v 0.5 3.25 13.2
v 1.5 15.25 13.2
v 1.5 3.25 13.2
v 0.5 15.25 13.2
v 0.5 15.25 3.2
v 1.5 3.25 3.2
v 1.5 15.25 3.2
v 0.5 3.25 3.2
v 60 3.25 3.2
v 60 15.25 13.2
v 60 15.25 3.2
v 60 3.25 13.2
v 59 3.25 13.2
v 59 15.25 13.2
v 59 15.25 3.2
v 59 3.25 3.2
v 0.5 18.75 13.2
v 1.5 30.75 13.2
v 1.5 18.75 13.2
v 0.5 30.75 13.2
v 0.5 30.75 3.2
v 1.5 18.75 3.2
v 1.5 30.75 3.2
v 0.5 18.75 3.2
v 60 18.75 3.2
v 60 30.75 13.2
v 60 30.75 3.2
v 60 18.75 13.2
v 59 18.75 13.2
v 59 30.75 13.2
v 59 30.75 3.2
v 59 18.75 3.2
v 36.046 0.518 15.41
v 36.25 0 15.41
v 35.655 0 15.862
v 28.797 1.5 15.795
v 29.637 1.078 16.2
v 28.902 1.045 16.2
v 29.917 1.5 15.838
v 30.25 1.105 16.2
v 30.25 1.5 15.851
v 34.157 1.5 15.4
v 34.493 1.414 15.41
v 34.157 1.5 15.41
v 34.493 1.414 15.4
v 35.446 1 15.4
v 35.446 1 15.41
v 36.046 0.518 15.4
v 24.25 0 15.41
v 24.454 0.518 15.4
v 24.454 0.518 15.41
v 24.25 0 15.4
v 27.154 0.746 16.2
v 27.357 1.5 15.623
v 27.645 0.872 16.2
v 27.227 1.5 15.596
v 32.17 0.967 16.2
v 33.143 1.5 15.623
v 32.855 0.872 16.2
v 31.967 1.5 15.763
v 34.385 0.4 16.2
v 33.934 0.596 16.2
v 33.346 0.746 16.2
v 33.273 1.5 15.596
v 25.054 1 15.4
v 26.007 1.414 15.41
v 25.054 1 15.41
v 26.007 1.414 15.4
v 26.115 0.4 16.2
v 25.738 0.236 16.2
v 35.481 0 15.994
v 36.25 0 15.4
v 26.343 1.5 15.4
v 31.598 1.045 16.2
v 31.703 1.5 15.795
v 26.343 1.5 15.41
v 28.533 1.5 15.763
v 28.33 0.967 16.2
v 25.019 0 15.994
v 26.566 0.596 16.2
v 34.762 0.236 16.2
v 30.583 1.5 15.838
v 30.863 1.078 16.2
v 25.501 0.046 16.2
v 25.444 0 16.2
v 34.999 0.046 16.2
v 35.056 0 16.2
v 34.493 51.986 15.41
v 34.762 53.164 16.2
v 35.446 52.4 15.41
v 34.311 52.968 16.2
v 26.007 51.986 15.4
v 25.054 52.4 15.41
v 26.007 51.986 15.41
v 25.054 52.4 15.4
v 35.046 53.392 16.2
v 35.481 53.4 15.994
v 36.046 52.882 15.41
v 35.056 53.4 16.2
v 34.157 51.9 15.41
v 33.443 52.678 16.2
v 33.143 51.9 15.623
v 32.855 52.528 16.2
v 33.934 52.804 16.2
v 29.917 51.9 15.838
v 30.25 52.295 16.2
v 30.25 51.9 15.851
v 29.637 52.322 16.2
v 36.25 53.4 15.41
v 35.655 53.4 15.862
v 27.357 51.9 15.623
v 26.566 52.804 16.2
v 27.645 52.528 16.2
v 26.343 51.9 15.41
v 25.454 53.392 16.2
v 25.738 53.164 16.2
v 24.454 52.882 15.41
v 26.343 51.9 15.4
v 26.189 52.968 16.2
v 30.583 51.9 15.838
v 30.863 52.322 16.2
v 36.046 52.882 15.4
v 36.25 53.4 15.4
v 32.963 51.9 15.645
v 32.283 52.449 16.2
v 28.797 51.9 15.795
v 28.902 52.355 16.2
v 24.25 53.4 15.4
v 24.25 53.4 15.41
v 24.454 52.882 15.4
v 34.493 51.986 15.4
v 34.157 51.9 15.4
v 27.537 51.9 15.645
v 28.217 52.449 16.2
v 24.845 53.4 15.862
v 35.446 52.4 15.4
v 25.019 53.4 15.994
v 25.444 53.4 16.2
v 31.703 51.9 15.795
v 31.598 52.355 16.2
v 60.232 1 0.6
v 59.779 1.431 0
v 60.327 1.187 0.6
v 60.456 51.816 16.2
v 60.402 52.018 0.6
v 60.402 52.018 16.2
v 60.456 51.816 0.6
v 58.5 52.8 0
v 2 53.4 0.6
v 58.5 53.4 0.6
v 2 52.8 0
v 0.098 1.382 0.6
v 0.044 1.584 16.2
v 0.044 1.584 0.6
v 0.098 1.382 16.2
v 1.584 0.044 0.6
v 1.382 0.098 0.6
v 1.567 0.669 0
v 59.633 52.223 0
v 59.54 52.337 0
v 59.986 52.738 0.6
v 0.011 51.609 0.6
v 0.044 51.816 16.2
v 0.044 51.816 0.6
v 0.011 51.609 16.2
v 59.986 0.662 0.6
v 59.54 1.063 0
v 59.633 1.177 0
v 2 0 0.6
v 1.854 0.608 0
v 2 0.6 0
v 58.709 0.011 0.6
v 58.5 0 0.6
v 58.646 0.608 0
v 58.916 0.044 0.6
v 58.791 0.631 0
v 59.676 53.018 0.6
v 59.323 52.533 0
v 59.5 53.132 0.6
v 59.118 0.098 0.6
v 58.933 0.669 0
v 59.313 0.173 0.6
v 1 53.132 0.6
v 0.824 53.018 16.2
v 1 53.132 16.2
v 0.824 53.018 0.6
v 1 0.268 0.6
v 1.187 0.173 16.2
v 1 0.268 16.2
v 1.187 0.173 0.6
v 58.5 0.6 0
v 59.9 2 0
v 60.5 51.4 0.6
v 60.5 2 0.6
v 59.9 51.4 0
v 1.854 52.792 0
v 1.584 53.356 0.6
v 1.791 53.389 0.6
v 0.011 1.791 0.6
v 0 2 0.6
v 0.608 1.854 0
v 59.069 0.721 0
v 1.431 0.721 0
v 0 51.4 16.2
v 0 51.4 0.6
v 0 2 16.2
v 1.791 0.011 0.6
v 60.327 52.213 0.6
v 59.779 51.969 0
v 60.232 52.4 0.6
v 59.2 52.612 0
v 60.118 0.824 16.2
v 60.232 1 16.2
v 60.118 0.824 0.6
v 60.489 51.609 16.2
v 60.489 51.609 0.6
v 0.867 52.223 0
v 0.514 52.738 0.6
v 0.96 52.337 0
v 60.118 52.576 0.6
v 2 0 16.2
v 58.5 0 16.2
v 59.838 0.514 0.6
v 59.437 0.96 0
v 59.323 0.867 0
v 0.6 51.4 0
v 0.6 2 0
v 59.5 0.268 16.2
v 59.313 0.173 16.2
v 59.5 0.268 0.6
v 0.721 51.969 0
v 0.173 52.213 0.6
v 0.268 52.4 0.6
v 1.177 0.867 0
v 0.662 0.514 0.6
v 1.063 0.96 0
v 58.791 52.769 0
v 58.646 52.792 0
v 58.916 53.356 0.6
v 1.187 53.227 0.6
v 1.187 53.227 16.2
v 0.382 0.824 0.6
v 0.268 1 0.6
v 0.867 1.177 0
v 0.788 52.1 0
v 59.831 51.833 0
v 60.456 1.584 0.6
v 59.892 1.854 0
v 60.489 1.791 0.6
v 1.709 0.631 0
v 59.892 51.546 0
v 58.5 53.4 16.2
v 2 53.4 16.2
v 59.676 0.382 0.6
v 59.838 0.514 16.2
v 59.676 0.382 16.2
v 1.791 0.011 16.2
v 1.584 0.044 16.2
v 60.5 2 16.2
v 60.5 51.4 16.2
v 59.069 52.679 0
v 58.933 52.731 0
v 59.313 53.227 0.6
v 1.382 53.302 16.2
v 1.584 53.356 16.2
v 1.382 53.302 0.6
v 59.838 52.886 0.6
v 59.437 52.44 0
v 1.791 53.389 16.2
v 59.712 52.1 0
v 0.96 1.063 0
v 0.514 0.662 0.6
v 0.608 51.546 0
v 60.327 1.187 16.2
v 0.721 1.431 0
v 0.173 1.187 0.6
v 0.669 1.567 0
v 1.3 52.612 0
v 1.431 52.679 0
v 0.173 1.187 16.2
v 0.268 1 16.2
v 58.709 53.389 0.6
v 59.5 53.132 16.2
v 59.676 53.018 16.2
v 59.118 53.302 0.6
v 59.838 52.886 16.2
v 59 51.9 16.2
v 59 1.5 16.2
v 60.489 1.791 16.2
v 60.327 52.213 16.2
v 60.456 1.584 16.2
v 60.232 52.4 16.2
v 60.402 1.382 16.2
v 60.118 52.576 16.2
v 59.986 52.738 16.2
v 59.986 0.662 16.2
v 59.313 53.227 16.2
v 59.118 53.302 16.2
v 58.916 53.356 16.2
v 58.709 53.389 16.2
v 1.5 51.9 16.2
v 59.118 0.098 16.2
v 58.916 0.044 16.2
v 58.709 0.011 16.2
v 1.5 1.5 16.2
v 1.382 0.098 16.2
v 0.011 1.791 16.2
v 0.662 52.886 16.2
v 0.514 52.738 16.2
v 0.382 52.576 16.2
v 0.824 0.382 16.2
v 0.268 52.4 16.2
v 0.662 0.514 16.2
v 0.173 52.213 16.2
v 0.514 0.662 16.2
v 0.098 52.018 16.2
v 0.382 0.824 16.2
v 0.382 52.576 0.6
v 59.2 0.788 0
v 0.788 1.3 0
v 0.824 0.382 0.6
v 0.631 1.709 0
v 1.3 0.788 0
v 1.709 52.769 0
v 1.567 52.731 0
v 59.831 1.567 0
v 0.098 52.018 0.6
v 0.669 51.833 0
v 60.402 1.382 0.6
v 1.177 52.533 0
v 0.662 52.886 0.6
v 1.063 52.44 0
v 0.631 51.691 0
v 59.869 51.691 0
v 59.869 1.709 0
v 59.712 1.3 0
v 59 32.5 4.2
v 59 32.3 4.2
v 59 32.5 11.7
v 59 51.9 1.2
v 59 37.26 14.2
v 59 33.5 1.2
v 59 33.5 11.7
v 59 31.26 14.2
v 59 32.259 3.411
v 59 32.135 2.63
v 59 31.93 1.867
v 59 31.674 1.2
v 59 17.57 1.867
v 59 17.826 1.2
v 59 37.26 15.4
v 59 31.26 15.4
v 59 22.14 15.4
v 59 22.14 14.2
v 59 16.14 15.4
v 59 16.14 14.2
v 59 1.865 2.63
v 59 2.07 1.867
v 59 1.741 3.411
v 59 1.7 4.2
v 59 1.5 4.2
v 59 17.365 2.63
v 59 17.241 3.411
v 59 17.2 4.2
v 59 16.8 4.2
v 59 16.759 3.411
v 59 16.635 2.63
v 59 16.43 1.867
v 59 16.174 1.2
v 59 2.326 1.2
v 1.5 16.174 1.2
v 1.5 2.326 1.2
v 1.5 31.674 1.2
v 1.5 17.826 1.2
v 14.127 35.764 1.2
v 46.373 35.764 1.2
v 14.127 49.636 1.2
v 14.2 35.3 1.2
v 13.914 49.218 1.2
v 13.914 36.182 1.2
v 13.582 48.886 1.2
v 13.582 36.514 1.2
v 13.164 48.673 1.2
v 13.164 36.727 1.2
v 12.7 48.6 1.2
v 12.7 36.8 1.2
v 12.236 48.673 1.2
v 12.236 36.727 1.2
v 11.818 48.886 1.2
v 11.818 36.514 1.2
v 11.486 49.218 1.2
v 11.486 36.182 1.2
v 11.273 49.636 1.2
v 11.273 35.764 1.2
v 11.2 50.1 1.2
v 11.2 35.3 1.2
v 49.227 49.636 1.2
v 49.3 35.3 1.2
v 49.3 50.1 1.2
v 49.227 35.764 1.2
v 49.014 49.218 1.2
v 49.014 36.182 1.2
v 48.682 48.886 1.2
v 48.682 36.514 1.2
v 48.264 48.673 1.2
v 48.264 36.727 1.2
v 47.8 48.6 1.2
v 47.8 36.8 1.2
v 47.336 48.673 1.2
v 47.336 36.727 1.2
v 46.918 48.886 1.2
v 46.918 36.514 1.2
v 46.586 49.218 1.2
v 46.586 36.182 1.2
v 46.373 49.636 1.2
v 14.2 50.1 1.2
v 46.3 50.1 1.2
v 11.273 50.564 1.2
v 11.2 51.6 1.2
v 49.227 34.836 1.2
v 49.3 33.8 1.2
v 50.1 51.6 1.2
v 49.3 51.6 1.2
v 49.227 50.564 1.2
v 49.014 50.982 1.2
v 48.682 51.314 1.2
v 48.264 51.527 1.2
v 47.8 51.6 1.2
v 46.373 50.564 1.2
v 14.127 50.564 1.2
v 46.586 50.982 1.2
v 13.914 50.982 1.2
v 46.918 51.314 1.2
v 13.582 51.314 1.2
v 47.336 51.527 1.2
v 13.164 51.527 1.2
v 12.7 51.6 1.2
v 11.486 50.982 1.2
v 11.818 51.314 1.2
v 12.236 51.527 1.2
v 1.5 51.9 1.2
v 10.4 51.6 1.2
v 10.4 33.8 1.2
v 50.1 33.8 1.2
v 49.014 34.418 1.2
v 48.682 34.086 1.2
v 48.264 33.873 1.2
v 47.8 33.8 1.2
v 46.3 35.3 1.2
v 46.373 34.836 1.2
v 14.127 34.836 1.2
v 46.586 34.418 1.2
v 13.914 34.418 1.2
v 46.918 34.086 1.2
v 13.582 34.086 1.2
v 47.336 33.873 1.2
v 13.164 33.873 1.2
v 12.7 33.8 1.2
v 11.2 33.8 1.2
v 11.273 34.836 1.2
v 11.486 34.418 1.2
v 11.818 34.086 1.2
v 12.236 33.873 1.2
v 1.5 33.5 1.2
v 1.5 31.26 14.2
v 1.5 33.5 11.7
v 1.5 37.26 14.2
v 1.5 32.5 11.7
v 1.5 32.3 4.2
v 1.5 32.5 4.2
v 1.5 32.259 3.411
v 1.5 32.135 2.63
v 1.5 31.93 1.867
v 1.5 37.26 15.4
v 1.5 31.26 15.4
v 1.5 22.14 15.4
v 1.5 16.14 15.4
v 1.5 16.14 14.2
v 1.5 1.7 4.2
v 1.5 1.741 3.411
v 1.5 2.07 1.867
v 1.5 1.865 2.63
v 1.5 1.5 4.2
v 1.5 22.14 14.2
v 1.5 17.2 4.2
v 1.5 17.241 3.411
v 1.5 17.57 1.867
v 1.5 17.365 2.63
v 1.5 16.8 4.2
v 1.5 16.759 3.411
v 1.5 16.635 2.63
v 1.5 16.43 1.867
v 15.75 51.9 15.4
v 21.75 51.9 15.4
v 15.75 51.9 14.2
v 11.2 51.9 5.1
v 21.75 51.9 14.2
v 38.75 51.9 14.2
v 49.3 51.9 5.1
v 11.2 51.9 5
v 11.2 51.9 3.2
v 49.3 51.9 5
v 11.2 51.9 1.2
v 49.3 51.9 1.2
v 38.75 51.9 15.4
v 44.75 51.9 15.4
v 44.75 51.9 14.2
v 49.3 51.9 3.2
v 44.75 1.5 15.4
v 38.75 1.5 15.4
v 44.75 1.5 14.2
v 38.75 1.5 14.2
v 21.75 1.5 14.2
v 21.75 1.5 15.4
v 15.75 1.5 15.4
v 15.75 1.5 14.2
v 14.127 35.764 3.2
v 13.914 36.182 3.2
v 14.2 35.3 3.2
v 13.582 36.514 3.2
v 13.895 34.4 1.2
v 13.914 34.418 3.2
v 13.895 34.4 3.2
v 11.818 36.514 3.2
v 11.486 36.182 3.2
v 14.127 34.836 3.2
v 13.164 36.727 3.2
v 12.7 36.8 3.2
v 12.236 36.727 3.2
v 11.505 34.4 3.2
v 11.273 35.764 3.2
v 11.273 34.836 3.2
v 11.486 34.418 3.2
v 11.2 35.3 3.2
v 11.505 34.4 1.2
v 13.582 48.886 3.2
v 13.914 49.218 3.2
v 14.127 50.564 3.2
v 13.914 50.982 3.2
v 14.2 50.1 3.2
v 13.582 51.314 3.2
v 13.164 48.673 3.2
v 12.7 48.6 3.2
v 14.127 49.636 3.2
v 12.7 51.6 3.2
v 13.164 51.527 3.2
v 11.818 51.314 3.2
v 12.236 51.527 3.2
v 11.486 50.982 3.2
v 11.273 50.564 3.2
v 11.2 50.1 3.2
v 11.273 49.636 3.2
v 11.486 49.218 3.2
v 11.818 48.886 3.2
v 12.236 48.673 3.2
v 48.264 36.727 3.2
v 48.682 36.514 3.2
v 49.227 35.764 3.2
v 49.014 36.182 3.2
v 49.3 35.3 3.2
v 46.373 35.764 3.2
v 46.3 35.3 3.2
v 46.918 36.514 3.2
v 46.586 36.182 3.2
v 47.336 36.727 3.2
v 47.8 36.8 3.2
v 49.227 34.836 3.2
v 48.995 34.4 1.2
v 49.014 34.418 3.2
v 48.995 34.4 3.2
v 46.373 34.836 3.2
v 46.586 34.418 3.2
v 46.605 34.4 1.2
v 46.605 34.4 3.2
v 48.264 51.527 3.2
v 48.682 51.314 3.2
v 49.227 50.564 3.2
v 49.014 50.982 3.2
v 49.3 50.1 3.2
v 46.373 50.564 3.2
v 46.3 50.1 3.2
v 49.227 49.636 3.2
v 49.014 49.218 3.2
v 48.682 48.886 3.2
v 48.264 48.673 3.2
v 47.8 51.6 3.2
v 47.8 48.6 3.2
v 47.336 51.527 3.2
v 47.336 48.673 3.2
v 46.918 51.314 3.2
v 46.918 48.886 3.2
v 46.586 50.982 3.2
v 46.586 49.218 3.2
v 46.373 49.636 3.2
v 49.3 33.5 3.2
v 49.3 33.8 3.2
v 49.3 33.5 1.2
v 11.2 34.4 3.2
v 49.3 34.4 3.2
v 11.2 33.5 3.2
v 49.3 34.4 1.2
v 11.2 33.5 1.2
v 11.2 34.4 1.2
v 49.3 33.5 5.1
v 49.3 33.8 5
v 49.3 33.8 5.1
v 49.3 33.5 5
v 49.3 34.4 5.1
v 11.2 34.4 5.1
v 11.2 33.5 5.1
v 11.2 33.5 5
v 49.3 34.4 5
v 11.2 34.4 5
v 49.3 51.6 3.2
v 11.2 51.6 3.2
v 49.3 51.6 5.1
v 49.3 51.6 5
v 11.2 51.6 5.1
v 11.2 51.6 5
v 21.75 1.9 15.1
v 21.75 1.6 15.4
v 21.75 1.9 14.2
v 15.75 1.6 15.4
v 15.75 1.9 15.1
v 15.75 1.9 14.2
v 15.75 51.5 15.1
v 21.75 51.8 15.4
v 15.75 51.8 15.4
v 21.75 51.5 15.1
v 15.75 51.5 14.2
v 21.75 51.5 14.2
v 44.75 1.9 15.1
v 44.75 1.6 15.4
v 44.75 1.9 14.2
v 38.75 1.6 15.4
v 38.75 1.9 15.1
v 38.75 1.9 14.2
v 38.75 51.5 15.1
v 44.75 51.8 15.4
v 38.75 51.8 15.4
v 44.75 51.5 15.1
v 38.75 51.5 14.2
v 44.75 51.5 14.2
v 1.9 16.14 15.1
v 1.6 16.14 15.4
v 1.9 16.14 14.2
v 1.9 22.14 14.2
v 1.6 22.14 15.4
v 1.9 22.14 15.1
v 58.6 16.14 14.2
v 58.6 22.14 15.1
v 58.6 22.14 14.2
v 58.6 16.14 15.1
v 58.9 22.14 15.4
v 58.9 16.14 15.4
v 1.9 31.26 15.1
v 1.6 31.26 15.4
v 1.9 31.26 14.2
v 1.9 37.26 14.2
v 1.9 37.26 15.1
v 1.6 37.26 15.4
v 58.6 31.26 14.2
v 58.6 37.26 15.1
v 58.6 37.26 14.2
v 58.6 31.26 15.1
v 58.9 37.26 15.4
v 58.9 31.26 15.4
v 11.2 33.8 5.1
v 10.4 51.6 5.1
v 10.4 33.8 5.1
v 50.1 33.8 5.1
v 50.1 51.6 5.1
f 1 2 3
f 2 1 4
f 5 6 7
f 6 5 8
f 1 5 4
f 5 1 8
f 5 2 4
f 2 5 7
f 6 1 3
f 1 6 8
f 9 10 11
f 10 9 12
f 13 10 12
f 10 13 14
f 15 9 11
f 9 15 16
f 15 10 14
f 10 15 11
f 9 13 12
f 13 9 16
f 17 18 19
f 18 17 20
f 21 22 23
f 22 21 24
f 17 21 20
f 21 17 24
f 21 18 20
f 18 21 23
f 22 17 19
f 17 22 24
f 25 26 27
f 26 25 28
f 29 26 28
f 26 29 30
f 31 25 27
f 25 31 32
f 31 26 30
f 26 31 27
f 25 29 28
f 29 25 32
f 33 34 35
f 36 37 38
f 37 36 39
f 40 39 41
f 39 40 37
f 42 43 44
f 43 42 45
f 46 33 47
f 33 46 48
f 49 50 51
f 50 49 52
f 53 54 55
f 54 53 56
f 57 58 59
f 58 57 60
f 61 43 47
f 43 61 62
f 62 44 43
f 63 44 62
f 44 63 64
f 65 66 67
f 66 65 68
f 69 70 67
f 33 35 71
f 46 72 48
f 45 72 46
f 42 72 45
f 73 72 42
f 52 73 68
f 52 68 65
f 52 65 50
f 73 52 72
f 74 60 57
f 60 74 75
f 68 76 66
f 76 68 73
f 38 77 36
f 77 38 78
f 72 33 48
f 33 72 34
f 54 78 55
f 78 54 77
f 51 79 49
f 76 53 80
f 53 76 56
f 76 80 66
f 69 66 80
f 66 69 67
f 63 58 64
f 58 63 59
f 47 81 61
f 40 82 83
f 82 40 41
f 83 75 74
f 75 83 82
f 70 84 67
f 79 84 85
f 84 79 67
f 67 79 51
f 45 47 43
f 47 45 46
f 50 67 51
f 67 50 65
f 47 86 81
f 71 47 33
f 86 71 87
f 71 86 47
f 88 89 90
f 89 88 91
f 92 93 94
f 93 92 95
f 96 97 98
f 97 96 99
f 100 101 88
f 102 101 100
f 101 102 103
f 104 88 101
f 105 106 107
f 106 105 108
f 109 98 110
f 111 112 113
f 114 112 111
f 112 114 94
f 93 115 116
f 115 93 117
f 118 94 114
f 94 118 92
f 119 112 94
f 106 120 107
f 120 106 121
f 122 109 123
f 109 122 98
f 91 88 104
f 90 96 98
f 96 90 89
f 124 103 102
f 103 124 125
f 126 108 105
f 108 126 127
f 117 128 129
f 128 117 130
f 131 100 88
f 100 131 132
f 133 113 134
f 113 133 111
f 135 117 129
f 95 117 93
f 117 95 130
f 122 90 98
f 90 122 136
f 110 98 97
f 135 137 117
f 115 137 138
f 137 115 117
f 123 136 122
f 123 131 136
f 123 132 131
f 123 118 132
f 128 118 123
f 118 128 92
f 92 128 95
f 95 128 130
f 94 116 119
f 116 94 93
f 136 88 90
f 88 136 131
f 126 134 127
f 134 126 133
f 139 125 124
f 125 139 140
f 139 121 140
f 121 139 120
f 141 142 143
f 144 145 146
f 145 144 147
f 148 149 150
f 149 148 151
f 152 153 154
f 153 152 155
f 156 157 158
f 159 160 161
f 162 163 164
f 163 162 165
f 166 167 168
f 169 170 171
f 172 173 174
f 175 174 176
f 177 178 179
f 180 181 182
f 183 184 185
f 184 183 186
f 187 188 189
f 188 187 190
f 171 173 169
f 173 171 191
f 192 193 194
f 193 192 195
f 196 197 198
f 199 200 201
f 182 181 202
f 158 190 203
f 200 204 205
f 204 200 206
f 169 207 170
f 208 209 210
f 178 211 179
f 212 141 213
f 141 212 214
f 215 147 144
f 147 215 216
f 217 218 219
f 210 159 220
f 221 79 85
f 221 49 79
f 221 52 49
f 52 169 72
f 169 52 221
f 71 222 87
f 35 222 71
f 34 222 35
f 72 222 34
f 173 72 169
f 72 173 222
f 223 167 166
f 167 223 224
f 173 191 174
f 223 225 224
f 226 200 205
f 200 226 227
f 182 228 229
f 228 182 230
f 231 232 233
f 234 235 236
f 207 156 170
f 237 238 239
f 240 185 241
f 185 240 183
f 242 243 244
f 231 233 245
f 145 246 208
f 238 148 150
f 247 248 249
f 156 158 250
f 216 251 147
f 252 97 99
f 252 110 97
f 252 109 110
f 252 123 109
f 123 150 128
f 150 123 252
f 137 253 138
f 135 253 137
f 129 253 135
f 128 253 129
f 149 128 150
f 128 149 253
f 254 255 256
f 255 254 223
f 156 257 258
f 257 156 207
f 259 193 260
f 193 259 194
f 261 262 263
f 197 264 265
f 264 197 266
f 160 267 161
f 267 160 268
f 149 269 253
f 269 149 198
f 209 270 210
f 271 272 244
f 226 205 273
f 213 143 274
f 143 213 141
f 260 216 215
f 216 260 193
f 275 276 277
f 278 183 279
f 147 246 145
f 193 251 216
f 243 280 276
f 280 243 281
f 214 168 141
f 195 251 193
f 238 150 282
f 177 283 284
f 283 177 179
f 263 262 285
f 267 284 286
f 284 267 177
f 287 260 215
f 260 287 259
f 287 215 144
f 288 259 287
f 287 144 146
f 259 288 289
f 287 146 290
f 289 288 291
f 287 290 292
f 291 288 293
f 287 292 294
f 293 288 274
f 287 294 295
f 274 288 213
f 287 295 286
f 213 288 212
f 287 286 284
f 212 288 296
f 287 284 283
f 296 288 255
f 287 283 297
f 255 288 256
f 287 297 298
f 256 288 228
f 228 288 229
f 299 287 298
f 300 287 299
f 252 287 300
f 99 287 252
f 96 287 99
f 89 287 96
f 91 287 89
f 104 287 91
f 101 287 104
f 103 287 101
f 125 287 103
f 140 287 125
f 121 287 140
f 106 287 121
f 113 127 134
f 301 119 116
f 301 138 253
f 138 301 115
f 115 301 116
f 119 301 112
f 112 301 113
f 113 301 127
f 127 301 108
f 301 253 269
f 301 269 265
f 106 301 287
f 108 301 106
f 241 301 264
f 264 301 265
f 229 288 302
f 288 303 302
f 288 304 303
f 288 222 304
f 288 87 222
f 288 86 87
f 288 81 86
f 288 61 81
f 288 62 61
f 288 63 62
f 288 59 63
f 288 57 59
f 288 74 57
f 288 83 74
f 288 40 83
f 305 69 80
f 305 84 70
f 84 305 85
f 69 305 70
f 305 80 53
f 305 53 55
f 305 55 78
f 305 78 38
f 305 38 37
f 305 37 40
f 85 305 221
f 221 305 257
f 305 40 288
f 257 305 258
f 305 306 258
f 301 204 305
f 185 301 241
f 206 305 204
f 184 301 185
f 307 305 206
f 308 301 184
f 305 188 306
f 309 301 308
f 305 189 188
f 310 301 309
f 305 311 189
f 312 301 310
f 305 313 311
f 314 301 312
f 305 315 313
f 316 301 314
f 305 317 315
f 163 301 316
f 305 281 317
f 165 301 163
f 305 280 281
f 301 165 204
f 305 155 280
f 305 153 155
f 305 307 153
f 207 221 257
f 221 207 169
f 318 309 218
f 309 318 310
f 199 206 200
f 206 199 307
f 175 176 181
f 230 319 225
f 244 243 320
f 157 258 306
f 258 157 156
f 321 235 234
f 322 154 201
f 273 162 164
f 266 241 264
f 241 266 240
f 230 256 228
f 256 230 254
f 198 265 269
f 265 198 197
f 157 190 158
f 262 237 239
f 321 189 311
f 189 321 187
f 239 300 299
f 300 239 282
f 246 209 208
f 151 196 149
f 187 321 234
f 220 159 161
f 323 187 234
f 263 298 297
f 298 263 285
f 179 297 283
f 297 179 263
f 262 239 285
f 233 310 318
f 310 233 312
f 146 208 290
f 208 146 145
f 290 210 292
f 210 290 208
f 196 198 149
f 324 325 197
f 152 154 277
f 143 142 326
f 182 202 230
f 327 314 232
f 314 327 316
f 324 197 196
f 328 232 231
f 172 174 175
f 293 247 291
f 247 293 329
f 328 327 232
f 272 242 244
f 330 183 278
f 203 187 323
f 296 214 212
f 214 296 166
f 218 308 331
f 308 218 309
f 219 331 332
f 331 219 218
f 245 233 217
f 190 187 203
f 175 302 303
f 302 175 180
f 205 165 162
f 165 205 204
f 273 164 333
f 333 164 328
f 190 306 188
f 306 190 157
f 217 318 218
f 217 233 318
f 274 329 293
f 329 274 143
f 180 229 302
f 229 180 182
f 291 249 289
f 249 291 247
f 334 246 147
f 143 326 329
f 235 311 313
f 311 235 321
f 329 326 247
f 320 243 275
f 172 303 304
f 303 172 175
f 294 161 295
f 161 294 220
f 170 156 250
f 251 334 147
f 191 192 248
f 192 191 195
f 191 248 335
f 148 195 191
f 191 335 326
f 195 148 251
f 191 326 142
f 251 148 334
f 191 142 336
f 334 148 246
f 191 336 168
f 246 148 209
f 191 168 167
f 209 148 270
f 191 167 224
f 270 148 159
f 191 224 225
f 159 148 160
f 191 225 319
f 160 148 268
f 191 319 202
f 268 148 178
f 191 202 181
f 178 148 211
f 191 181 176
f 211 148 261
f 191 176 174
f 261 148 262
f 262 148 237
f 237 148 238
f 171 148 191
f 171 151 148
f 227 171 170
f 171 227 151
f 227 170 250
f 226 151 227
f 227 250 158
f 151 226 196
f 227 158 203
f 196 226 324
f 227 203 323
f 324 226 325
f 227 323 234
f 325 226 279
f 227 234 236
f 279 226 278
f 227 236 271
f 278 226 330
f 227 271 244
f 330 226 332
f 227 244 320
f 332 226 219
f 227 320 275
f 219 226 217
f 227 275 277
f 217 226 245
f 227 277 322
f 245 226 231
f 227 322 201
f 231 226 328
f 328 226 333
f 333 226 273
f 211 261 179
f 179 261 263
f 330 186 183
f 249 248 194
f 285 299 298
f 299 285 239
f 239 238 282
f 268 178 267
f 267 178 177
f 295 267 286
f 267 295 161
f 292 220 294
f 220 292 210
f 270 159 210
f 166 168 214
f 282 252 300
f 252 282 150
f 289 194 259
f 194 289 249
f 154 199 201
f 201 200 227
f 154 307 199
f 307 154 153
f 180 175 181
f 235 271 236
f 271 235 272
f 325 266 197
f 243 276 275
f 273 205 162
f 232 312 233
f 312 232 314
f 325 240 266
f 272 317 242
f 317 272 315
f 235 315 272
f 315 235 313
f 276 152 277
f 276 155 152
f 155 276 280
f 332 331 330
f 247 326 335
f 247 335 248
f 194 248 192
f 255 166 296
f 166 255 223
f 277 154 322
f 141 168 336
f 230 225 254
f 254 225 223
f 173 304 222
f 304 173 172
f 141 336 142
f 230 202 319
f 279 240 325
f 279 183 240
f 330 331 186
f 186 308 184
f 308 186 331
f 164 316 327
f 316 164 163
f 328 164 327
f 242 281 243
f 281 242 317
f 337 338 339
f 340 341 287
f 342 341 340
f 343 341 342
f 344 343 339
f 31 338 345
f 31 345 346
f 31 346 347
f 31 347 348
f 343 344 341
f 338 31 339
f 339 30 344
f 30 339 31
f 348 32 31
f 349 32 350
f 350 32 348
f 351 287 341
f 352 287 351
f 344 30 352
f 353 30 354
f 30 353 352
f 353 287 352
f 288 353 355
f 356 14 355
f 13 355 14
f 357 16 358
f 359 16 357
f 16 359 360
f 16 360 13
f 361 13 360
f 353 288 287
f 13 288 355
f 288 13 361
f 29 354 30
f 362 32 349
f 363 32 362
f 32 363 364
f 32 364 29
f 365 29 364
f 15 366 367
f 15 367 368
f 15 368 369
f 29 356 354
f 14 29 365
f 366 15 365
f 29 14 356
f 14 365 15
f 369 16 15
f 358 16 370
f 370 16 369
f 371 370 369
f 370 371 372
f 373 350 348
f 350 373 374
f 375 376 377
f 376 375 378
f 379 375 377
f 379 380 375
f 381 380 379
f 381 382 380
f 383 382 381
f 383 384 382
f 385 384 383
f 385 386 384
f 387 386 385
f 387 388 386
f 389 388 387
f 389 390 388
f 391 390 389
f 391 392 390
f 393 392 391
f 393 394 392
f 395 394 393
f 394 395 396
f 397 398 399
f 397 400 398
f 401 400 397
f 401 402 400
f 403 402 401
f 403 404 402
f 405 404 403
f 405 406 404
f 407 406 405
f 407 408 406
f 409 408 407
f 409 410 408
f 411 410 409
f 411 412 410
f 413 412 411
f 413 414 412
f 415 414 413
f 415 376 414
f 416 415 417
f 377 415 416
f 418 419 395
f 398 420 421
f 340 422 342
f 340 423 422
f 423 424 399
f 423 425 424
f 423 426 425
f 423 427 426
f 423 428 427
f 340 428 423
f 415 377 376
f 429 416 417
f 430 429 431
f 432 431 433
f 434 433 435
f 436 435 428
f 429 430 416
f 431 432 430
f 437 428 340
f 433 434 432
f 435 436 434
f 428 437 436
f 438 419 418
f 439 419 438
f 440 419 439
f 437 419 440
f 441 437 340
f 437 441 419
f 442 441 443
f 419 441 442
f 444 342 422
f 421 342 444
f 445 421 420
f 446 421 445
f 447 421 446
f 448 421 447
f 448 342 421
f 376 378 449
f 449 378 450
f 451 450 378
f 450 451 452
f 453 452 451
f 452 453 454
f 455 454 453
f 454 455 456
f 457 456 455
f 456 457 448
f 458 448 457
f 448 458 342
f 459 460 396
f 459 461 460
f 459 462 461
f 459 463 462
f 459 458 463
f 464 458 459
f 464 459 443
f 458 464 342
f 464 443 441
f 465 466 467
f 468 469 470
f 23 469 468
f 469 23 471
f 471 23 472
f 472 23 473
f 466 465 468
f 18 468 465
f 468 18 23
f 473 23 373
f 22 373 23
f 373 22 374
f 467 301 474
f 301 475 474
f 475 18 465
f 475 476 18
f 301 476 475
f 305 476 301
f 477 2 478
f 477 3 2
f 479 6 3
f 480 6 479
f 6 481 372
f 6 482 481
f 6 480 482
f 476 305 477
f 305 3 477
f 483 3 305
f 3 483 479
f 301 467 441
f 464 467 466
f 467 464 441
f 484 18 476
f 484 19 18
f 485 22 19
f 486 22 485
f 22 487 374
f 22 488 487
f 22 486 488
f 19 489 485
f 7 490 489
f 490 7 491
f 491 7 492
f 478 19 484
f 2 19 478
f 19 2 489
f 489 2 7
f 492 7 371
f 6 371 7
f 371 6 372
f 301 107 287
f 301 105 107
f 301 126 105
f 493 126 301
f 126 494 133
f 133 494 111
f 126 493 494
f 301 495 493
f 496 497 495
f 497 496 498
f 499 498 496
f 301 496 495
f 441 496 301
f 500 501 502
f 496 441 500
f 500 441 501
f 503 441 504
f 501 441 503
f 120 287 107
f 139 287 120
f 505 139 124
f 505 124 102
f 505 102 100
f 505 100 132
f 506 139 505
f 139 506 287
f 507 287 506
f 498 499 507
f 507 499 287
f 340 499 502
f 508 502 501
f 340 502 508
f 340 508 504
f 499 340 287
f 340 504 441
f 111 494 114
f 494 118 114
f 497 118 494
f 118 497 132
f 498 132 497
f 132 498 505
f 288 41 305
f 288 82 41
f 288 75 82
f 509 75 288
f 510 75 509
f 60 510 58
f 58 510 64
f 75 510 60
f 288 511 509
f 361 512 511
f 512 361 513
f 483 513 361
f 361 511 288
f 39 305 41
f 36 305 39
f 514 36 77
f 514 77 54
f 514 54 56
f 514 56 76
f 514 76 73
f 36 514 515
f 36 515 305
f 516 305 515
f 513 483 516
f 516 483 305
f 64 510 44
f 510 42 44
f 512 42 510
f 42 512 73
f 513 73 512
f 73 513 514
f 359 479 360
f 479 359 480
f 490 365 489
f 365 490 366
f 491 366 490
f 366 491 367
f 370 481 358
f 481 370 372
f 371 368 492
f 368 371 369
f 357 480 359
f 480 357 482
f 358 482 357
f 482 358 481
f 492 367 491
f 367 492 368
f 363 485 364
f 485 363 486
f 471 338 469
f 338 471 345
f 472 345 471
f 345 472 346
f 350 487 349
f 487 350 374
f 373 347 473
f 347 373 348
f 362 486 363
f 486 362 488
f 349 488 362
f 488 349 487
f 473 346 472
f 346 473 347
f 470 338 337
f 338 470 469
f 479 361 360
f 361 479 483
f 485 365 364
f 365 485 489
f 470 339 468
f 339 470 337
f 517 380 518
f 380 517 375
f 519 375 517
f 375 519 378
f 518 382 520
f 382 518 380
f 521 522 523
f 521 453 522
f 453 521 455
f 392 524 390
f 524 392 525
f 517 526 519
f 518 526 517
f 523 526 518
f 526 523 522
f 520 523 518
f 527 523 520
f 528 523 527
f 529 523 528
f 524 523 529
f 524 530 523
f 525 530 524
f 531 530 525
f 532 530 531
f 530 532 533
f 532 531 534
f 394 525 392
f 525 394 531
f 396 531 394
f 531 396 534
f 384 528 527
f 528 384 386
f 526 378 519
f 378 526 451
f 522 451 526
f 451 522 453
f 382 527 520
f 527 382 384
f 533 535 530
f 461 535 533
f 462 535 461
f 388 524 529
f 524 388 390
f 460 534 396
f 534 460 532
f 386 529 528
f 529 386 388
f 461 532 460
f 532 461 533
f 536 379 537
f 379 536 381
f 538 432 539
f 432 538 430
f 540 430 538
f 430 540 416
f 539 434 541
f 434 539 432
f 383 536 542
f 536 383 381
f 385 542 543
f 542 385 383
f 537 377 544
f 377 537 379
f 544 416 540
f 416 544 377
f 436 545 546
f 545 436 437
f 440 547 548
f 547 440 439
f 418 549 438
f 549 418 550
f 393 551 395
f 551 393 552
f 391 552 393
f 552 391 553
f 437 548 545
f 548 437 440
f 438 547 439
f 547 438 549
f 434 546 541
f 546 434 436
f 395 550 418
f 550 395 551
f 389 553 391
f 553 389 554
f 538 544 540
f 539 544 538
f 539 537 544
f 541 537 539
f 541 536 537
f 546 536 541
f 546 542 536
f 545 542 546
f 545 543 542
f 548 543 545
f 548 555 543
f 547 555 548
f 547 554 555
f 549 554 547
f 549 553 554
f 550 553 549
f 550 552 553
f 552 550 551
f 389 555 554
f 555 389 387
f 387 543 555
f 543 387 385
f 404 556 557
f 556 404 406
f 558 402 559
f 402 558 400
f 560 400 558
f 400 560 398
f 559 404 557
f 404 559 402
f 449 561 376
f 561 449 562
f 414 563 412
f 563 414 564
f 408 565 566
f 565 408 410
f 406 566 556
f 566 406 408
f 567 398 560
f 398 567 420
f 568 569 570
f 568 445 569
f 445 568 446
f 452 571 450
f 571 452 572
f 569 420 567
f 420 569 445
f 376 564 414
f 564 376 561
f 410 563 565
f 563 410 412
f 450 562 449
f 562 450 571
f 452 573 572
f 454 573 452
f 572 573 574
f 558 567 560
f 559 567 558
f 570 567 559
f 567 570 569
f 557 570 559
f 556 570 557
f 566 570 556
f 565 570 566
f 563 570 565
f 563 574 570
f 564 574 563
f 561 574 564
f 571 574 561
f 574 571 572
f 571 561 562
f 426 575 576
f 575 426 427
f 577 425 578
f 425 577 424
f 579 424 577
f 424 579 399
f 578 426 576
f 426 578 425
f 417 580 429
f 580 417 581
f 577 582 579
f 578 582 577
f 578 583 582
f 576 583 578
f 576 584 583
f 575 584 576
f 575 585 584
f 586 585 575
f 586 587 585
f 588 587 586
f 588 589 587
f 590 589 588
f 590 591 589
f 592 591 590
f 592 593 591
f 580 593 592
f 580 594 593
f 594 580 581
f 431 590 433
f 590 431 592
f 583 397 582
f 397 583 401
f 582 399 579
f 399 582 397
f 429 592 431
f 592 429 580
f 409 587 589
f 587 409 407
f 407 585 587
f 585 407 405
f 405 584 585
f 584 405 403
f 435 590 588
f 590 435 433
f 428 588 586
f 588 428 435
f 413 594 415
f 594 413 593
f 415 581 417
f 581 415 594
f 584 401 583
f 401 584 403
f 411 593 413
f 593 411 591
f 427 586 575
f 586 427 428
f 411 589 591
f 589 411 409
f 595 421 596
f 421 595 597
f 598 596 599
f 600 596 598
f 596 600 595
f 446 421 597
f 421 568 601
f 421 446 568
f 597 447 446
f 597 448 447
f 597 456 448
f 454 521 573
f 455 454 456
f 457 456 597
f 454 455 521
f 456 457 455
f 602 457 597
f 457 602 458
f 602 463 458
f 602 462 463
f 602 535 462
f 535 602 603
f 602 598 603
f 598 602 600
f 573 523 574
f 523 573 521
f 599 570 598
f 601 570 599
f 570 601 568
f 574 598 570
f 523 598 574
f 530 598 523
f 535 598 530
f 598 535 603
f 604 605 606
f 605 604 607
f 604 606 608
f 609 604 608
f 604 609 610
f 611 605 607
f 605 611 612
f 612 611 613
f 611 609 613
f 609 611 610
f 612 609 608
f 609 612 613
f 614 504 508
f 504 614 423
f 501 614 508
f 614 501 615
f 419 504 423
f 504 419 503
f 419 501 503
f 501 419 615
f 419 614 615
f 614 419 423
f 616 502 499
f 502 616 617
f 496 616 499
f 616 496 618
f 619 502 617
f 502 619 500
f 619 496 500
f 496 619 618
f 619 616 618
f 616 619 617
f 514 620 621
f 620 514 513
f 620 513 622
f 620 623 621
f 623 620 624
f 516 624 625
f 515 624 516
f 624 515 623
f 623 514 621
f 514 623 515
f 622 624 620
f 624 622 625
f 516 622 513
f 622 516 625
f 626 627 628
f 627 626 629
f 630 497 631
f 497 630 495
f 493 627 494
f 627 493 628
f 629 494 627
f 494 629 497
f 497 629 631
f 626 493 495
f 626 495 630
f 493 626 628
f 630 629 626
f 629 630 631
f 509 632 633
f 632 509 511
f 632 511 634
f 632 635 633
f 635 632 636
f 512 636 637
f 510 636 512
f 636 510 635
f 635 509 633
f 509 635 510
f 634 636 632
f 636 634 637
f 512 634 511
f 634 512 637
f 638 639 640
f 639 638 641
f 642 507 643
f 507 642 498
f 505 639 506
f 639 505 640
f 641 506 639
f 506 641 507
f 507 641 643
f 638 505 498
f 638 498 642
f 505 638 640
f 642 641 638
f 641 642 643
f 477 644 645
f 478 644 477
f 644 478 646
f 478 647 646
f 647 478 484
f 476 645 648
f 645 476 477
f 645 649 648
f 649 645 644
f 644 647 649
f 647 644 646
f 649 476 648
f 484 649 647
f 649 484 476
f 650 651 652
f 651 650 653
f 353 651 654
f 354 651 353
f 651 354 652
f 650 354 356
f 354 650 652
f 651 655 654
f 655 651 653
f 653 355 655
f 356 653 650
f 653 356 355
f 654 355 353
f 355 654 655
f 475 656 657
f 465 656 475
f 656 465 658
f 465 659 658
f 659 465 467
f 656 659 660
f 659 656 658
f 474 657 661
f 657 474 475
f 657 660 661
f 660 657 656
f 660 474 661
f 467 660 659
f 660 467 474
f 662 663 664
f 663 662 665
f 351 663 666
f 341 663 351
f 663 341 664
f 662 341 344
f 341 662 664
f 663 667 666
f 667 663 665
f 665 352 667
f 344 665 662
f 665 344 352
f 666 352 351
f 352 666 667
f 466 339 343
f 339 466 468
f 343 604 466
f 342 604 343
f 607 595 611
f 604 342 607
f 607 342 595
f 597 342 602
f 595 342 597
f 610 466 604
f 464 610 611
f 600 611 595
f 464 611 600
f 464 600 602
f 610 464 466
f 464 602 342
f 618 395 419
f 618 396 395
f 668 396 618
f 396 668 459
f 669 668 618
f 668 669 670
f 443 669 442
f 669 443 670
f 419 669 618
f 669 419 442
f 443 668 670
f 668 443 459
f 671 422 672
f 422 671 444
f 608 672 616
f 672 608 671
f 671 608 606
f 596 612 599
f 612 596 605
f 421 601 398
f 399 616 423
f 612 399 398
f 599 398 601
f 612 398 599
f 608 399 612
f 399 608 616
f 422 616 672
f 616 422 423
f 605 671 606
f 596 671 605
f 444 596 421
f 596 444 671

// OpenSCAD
// =============================================
// Rydful-Beacon Rectangular Case v1 — 2×AA
// - 2×AA side by side with spring contacts
// - PCB 17.8×38.1mm beside batteries
// - Snap-fit lid, rounded corners
// - Orient: batteries along X, PCB beside in Y
// =============================================

// AA Battery
aa_dia        = 14.5;   // Battery diameter
aa_len        = 50.5;   // Battery length (incl. positive nub)
spring_cl     = 3.5;    // Spring contact clearance per end
batt_gap      = 1.0;    // Gap between two batteries
batt_cl       = 0.5;    // Battery clearance to walls
cradle_depth  = 3.0;    // Cradle channel depth

// PCB
pcb_l         = 38.1;   // Length (X)
pcb_w         = 17.8;   // Width (Y)
pcb_thk       = 1.6;
comp_h        = 2.0;    // Max component height (top side)
pcb_gap       = 0.3;    // Clearance around PCB

// Case
wall          = 1.5;
floor_h       = 1.2;
ceil_h        = 1.0;
corner_r      = 2.0;
chamfer       = 0.6;
div_wall      = 1.0;    // Divider between battery/PCB sections

// Snap-fit
snap_bump     = 0.4;
snap_h        = 1.2;
snap_chamf    = 0.3;

// Lid
skirt_d       = 2.5;
lid_gap       = 0.1;
sk_wall       = 1.2;    // Skirt wall thickness

// PCB support
standoff_h    = 2.0;
standoff_d    = 3.0;

// Text engraving
engrave_depth = 0.4;
engrave_w     = 30;     // Text width (mm)

// Spring contact pockets
contact_w     = 12.0;   // Contact plate width
contact_h     = 10.0;   // Contact plate height
contact_d     = 1.0;    // Pocket depth into wall

$fn = 60;

// ---- Derived ----
batt_sec_x = aa_len + 2 * spring_cl;
batt_sec_y = 2 * aa_dia + batt_gap + 2 * batt_cl;
pcb_sec_y  = pcb_w + 2 * pcb_gap;

cav_x = batt_sec_x;
cav_y = batt_sec_y + div_wall + pcb_sec_y;
cav_z = aa_dia + batt_cl;

ext_x = cav_x + 2 * wall;
ext_y = cav_y + 2 * wall;
base_h = floor_h + cav_z;

// PCB origin inside cavity
pcb_ox = wall + (cav_x - pcb_l) / 2;
pcb_oy = wall + batt_sec_y + div_wall + pcb_gap;

echo(str("Case: ", ext_x, " × ", ext_y, " × ", base_h + ceil_h, " mm"));
echo(str("Battery section: ", batt_sec_x, " × ", batt_sec_y, " mm"));
echo(str("PCB section: ", cav_x, " × ", pcb_sec_y, " mm"));

// =============================================
// ROUNDED RECTANGLE (2D)
// =============================================
module rrect(x, y, r) {
    offset(r) offset(-r)
        square([x, y]);
}

// =============================================
// CHAMFERED ROUNDED RECTANGLE
// =============================================
module cham_rrect_bot(x, y, h, r, c) {
    hull() {
        linear_extrude(0.01)
            translate([c, c])
                rrect(x - 2*c, y - 2*c, max(r - c, 0.1));
        translate([0, 0, c])
            linear_extrude(h - c)
                rrect(x, y, r);
    }
}

module cham_rrect_top(x, y, h, r, c) {
    hull() {
        linear_extrude(h - c)
            rrect(x, y, r);
        translate([c, c, h - 0.01])
            linear_extrude(0.01)
                rrect(x - 2*c, y - 2*c, max(r - c, 0.1));
    }
}

// =============================================
// BASE
// =============================================
module base() {
    difference() {
        // Outer shell (chamfered bottom edge)
        cham_rrect_bot(ext_x, ext_y, base_h, corner_r, chamfer);

        // Internal cavity
        translate([wall, wall, floor_h])
            cube([cav_x, cav_y, cav_z + 1]);

        // Spring contact pockets — recesses in end walls (glue contacts in)
        for (i = [0, 1]) {
            batt_cy = wall + batt_cl + aa_dia/2 + i * (aa_dia + batt_gap);
            pocket_z = floor_h + cradle_depth - 1;

            // Negative end (X=0 wall)
            translate([wall - contact_d, batt_cy - contact_w/2, pocket_z])
                cube([contact_d + 0.1, contact_w, contact_h]);
            // Positive end (X=max wall)
            translate([wall + cav_x - 0.1, batt_cy - contact_w/2, pocket_z])
                cube([contact_d + 0.1, contact_w, contact_h]);
        }

        // Fingernail pry notches — centered on long sides
        for (dy = [0, ext_y]) {
            translate([ext_x/2, dy, base_h - 0.8])
            scale([3, 1, 1])
            hull() {
                cylinder(d = 4, h = 0.01, $fn = 24);
                translate([0, dy == 0 ? -1.2 : 1.2, 1.5])
                    cylinder(d = 3, h = 0.01, $fn = 24);
            }
        }
    }

    // ---- Internal features (added after hollow) ----

    // Battery cradle — raised floor with cylindrical channels
    difference() {
        translate([wall, wall, floor_h])
            cube([batt_sec_x, batt_sec_y, cradle_depth]);

        for (i = [0, 1]) {
            by = wall + batt_cl + aa_dia/2 + i * (aa_dia + batt_gap);
            translate([wall - 0.1, by, floor_h + cradle_depth])
                rotate([0, 90, 0])
                    cylinder(d = aa_dia + 0.6, h = batt_sec_x + 0.2);
        }
    }

    // Divider wall (70% height — open top for wire routing)
    translate([wall, wall + batt_sec_y, floor_h])
        cube([cav_x, div_wall, cav_z * 0.7]);

    // PCB standoffs — 4 posts near PCB corners
    for (dx = [1.5, pcb_l - 1.5], dy = [1.5, pcb_w - 1.5])
        translate([pcb_ox + dx, pcb_oy + dy, floor_h])
            cylinder(d = standoff_d, h = standoff_h, $fn = 20);

    // PCB slide-in rails (Y sides) — L-shaped channels that capture PCB edges
    rail_lip   = 0.6;    // Lip overhang over PCB edge
    rail_wall  = 0.8;    // Rail outer wall thickness
    rail_h     = standoff_h + pcb_thk + 0.3;  // Full height incl. lip
    rail_slot  = pcb_thk + 0.2;  // Slot height (PCB + clearance)

    for (side = [0, 1]) {
        ry = side == 0
            ? pcb_oy - rail_wall          // Near side
            : pcb_oy + pcb_w;             // Far side
        translate([pcb_ox, ry, floor_h]) {
            // Base wall (full height below PCB lip)
            cube([pcb_l, rail_wall, standoff_h]);
            // Upper wall (below PCB)
            cube([pcb_l, rail_wall + rail_lip, standoff_h]);
            // Lip overhang (above PCB slot)
            translate([0, 0, standoff_h + rail_slot])
                cube([pcb_l, rail_wall + rail_lip, rail_h - standoff_h - rail_slot]);
        }
    }

    // PCB end stops (X sides) — short walls at both ends
    stop_h = standoff_h + pcb_thk + 0.3;
    stop_w = 0.8;
    // Near X end
    translate([pcb_ox - stop_w, pcb_oy, floor_h])
        cube([stop_w, pcb_w, stop_h]);
    // Far X end
    translate([pcb_ox + pcb_l, pcb_oy, floor_h])
        cube([stop_w, pcb_w, stop_h]);

    // Snap bumps — protrude from inner walls into cavity
    bump_z = base_h - skirt_d + 0.5;
    bump_w = 6;

    // On Y walls (long sides)
    for (sx = [wall + cav_x * 0.3, wall + cav_x * 0.7]) {
        // Near Y wall
        translate([sx - bump_w/2, wall, bump_z])
        hull() {
            cube([bump_w, snap_bump, snap_h - snap_chamf]);
            translate([0, 0, snap_h - snap_chamf])
                cube([bump_w, 0.1, snap_chamf]);
        }
        // Far Y wall
        translate([sx - bump_w/2, wall + cav_y - snap_bump, bump_z])
        hull() {
            cube([bump_w, snap_bump, snap_h - snap_chamf]);
            translate([0, snap_bump - 0.1, snap_h - snap_chamf])
                cube([bump_w, 0.1, snap_chamf]);
        }
    }

    // On X walls (short sides)
    for (sy = [wall + cav_y * 0.35, wall + cav_y * 0.65]) {
        // Near X wall
        translate([wall, sy - bump_w/2, bump_z])
        hull() {
            cube([snap_bump, bump_w, snap_h - snap_chamf]);
            translate([0, 0, snap_h - snap_chamf])
                cube([0.1, bump_w, snap_chamf]);
        }
        // Far X wall
        translate([wall + cav_x - snap_bump, sy - bump_w/2, bump_z])
        hull() {
            cube([snap_bump, bump_w, snap_h - snap_chamf]);
            translate([snap_bump - 0.1, 0, snap_h - snap_chamf])
                cube([0.1, bump_w, snap_chamf]);
        }
    }
}

// =============================================
// LID
// =============================================
module lid() {
    skirt_x = cav_x - 2 * lid_gap;
    skirt_y = cav_y - 2 * lid_gap;
    bump_w  = 6;

    difference() {
        union() {
            // Top plate (chamfered top edge)
            cham_rrect_top(ext_x, ext_y, ceil_h, corner_r, chamfer);

            // Skirt (nests inside base cavity)
            translate([wall + lid_gap, wall + lid_gap, -skirt_d])
            difference() {
                cube([skirt_x, skirt_y, skirt_d]);
                translate([sk_wall, sk_wall, -0.01])
                    cube([skirt_x - 2*sk_wall, skirt_y - 2*sk_wall,
                          skirt_d + 0.02]);
            }
        }

        // Snap grooves — channels on skirt outer surface
        // On Y walls (long sides)
        for (sx = [wall + cav_x * 0.3, wall + cav_x * 0.7]) {
            // Near Y side
            translate([sx - bump_w/2 - 0.3,
                       wall + lid_gap - 0.1,
                       -skirt_d + 0.3])
                cube([bump_w + 0.6, snap_bump + 0.3, snap_h + 0.2]);
            // Far Y side
            translate([sx - bump_w/2 - 0.3,
                       wall + lid_gap + skirt_y - snap_bump - 0.2,
                       -skirt_d + 0.3])
                cube([bump_w + 0.6, snap_bump + 0.3, snap_h + 0.2]);
        }

        // On X walls (short sides)
        for (sy = [wall + cav_y * 0.35, wall + cav_y * 0.65]) {
            // Near X side
            translate([wall + lid_gap - 0.1,
                       sy - bump_w/2 - 0.3,
                       -skirt_d + 0.3])
                cube([snap_bump + 0.3, bump_w + 0.6, snap_h + 0.2]);
            // Far X side
            translate([wall + lid_gap + skirt_x - snap_bump - 0.2,
                       sy - bump_w/2 - 0.3,
                       -skirt_d + 0.3])
                cube([snap_bump + 0.3, bump_w + 0.6, snap_h + 0.2]);
        }

        // Engraved "Rydful" text centered on lid top
        translate([ext_x/2, ext_y/2, ceil_h - engrave_depth])
            linear_extrude(engrave_depth + 0.01)
                resize([engrave_w, 0], auto=true)
                    text("Rydful", halign="center", valign="center",
                         font="Liberation Sans:style=Bold");
    }
}

// =============================================
// RENDER — comment out for export
// =============================================
// base();
// rotate([180,0,0]) lid();

base();
// rotate([180,0,0]) lid();

// Phantom batteries
%for (i = [0, 1]) {
    by = wall + batt_cl + aa_dia/2 + i * (aa_dia + batt_gap);
    translate([wall + spring_cl, by, floor_h + cradle_depth])
        rotate([0, 90, 0])
            cylinder(d = aa_dia, h = aa_len, $fn = 30);
}

// Phantom PCB
%translate([pcb_ox, pcb_oy, floor_h + standoff_h])
    cube([pcb_l, pcb_w, pcb_thk]);
